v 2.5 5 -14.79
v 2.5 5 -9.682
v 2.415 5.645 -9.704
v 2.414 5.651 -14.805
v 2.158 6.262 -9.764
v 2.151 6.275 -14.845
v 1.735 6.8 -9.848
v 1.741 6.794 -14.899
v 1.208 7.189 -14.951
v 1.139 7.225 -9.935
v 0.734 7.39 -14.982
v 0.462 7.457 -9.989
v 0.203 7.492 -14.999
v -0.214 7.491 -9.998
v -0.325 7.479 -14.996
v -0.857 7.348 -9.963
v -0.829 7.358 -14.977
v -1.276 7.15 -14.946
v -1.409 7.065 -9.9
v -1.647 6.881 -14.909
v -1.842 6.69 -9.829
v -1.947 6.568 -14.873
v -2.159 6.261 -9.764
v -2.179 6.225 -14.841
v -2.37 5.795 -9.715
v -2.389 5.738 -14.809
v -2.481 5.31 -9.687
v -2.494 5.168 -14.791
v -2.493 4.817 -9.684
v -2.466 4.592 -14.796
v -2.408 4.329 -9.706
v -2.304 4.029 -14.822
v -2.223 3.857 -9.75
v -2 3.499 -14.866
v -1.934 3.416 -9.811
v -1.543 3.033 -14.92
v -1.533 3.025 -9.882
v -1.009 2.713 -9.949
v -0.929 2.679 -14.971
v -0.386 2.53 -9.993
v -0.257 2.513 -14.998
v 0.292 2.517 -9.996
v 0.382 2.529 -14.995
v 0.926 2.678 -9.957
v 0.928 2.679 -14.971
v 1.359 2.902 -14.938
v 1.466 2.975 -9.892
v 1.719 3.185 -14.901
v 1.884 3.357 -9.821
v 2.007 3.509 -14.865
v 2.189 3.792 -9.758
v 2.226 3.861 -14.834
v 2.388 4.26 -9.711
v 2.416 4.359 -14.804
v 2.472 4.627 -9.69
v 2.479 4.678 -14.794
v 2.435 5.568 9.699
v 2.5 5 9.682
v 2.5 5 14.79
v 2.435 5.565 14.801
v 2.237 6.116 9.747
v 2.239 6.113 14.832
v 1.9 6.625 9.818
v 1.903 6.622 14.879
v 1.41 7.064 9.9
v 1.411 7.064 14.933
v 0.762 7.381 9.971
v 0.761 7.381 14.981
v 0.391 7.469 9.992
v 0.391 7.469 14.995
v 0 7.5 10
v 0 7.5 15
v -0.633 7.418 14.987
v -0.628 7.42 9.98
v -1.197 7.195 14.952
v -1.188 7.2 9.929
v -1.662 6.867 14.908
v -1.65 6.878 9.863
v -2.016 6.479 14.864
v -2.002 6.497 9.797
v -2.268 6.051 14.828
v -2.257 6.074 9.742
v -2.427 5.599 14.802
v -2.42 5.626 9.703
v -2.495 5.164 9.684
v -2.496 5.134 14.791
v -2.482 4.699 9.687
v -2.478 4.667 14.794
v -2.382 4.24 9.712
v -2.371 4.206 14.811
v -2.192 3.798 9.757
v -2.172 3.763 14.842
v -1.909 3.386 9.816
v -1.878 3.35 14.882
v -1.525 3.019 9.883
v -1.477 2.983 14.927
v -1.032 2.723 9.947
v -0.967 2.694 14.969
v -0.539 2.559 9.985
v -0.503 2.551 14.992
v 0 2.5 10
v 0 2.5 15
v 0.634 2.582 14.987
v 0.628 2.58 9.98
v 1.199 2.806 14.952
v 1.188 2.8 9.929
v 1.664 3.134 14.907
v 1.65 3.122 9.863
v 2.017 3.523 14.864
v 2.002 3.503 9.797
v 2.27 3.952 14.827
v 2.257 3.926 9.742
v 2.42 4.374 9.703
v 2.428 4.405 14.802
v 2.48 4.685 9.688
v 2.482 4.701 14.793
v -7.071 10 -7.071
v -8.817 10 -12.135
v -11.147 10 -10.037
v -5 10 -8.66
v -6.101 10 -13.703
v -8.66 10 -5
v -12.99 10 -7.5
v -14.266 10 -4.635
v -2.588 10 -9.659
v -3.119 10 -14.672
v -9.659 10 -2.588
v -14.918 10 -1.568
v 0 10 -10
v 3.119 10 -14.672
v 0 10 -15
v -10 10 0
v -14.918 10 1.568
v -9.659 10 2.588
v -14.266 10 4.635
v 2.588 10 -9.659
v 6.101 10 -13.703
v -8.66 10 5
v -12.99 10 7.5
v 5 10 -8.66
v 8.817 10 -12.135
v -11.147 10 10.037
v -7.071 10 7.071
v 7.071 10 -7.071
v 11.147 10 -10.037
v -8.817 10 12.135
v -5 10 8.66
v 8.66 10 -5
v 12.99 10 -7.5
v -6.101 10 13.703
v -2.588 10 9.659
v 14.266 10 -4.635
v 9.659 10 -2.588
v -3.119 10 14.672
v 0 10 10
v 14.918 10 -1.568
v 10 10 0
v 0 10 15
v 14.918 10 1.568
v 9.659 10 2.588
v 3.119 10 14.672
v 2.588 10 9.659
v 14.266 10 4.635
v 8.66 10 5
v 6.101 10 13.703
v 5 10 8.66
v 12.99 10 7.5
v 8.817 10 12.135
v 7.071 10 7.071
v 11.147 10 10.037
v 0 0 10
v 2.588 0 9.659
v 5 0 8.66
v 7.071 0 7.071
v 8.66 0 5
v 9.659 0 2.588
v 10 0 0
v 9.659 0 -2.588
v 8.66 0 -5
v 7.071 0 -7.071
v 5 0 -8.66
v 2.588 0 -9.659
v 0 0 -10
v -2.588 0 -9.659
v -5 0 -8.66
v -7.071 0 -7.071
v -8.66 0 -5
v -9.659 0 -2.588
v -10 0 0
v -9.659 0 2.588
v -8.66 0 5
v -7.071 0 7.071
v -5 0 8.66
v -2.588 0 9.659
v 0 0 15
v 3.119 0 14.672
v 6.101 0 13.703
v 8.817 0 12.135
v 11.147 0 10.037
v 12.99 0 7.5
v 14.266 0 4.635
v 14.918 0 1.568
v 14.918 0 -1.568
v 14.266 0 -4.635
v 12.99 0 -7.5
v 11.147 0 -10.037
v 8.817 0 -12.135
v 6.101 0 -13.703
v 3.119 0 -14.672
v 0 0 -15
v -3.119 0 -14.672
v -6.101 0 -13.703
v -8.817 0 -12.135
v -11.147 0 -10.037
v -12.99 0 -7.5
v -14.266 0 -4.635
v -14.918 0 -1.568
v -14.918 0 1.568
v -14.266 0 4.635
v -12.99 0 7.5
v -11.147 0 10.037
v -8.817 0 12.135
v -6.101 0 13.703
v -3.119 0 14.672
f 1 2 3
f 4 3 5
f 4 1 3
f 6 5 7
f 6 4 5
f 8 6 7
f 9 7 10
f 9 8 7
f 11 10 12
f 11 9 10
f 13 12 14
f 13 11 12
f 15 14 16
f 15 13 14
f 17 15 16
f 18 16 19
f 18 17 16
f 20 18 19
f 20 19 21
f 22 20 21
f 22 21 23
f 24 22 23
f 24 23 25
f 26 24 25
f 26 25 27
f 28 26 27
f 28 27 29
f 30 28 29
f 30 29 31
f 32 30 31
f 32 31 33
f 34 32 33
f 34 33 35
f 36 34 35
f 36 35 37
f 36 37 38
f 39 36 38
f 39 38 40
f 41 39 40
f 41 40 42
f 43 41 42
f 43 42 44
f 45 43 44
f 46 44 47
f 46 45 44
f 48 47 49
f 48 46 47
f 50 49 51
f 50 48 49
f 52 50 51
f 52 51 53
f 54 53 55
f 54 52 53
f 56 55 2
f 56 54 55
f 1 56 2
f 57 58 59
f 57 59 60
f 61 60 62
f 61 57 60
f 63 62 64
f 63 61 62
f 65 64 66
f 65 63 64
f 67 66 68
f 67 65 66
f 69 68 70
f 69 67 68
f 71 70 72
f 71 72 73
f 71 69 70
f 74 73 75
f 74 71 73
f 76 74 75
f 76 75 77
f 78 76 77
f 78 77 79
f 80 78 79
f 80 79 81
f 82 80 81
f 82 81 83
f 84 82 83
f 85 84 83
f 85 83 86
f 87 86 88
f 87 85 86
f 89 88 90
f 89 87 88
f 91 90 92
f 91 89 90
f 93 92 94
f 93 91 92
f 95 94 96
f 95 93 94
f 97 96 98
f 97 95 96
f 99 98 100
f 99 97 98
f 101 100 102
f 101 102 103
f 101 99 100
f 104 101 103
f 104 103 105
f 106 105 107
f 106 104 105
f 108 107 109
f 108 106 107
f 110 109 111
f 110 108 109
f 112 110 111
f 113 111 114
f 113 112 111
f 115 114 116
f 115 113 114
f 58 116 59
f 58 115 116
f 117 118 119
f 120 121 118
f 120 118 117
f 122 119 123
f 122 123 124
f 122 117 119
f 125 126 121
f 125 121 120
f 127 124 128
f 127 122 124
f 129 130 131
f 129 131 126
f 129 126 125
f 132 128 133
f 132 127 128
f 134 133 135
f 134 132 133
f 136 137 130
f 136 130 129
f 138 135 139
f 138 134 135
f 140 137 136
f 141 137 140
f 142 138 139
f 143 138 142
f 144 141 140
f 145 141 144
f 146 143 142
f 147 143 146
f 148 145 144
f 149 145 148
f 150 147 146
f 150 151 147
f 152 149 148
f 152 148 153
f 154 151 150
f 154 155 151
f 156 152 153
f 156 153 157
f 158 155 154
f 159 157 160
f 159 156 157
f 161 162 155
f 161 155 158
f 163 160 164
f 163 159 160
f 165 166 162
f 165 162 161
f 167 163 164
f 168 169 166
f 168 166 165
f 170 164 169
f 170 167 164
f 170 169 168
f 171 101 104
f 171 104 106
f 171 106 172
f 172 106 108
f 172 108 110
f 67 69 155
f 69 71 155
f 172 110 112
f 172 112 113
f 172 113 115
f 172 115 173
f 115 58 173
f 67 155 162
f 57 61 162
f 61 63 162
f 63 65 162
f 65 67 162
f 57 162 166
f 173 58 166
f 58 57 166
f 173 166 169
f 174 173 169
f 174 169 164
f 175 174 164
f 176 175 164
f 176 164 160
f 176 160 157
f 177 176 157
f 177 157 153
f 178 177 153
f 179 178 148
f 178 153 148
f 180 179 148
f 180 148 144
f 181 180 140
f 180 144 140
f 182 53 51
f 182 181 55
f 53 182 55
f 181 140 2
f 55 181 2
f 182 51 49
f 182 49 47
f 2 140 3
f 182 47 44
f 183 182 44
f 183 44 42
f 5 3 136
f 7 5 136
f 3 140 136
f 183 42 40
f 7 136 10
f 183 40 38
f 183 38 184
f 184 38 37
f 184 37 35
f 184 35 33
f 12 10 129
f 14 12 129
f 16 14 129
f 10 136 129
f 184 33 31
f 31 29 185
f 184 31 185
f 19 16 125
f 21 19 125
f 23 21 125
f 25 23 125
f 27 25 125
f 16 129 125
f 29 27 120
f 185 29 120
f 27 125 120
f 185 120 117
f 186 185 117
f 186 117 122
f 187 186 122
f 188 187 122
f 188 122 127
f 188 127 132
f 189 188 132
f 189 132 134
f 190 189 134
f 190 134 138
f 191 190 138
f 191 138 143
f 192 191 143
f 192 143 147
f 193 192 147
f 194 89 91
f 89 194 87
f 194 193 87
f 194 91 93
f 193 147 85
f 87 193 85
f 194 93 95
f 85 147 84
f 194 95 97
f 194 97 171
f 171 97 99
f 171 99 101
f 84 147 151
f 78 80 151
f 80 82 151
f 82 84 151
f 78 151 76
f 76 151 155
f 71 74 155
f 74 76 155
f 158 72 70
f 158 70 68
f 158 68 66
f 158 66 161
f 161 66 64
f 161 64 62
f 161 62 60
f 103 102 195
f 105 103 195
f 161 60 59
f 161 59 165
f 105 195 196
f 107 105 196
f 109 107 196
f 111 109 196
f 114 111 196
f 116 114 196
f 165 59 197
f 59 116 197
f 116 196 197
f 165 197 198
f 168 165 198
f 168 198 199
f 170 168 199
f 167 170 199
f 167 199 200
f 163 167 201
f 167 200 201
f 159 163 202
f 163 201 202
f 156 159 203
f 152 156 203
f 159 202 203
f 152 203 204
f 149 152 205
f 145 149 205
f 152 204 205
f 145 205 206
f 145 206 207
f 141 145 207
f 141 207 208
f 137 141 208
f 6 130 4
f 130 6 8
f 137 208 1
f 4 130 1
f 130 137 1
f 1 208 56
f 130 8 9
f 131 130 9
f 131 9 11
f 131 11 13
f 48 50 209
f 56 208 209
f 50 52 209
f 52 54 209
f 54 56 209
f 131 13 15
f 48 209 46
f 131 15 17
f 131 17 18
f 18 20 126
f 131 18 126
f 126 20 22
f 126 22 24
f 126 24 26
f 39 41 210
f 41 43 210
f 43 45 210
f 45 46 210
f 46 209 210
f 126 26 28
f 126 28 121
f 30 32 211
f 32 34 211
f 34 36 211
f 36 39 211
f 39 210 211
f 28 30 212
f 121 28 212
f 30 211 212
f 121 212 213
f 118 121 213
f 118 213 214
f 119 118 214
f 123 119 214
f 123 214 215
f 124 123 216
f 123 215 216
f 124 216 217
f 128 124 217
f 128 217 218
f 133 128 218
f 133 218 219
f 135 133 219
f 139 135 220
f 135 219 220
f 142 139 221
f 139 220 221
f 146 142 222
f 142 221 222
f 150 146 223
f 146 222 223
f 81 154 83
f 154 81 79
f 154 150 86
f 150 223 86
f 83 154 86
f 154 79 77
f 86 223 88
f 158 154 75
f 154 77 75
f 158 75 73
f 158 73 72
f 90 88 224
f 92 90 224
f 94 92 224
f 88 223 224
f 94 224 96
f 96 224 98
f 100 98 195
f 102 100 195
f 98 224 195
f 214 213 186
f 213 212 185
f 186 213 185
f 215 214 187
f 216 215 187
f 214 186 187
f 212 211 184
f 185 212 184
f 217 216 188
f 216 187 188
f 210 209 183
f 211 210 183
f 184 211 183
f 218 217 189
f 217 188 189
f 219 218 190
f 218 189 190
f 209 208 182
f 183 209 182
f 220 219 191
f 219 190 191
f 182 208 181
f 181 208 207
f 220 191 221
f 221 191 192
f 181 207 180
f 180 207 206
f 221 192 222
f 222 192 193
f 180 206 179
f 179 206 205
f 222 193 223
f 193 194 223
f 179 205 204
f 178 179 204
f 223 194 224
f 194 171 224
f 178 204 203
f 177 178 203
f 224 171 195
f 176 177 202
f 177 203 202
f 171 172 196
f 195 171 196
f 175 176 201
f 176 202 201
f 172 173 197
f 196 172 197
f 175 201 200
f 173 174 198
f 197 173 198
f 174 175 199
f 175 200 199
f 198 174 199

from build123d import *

# Parameters (mm, degrees)
SKETCH2_R               = 15
BOSS_EXTRUDE1_DEPTH     = 10
SKETCH3_R               = 10
CUT_EXTRUDE1_DEPTH      = 24.452078799
CUT_EXTRUDE2_DEPTH      = 24.452078799
CUT_EXTRUDE2_DEPTH_BACK = 24.452078799
SKETCH4_R               = 2.5


with BuildPart() as part:
    # Sketch2 → Boss-Extrude1 (new body)
    with BuildSketch(Plane(origin=(0, 0, 0), x_dir=(1, 0, 0), z_dir=(0, 1, 0))):
        with Locations(Location((0, 0, 0), (0, 0, 270))):
            Circle(SKETCH2_R)
    extrude(amount=BOSS_EXTRUDE1_DEPTH)

    # Sketch3 → Cut-Extrude1 (cut, through all)
    with BuildSketch(Plane(origin=(0, 10, 0), x_dir=(1, 0, 0), z_dir=(0, 1, 0))):
        with Locations(Location((0, 0, 0), (0, 0, 270))):
            Circle(SKETCH3_R)
    extrude(amount=-CUT_EXTRUDE1_DEPTH, mode=Mode.SUBTRACT)

    # Sketch4 → Cut-Extrude2 (cut, two sides: drawn at the far end of the back side and taken through both)
    with BuildSketch(Plane.XY.offset(-CUT_EXTRUDE2_DEPTH_BACK)):
        with Locations((0, 5)):
            Circle(SKETCH4_R)
    extrude(amount=CUT_EXTRUDE2_DEPTH + CUT_EXTRUDE2_DEPTH_BACK, mode=Mode.SUBTRACT)


solid = part.part
